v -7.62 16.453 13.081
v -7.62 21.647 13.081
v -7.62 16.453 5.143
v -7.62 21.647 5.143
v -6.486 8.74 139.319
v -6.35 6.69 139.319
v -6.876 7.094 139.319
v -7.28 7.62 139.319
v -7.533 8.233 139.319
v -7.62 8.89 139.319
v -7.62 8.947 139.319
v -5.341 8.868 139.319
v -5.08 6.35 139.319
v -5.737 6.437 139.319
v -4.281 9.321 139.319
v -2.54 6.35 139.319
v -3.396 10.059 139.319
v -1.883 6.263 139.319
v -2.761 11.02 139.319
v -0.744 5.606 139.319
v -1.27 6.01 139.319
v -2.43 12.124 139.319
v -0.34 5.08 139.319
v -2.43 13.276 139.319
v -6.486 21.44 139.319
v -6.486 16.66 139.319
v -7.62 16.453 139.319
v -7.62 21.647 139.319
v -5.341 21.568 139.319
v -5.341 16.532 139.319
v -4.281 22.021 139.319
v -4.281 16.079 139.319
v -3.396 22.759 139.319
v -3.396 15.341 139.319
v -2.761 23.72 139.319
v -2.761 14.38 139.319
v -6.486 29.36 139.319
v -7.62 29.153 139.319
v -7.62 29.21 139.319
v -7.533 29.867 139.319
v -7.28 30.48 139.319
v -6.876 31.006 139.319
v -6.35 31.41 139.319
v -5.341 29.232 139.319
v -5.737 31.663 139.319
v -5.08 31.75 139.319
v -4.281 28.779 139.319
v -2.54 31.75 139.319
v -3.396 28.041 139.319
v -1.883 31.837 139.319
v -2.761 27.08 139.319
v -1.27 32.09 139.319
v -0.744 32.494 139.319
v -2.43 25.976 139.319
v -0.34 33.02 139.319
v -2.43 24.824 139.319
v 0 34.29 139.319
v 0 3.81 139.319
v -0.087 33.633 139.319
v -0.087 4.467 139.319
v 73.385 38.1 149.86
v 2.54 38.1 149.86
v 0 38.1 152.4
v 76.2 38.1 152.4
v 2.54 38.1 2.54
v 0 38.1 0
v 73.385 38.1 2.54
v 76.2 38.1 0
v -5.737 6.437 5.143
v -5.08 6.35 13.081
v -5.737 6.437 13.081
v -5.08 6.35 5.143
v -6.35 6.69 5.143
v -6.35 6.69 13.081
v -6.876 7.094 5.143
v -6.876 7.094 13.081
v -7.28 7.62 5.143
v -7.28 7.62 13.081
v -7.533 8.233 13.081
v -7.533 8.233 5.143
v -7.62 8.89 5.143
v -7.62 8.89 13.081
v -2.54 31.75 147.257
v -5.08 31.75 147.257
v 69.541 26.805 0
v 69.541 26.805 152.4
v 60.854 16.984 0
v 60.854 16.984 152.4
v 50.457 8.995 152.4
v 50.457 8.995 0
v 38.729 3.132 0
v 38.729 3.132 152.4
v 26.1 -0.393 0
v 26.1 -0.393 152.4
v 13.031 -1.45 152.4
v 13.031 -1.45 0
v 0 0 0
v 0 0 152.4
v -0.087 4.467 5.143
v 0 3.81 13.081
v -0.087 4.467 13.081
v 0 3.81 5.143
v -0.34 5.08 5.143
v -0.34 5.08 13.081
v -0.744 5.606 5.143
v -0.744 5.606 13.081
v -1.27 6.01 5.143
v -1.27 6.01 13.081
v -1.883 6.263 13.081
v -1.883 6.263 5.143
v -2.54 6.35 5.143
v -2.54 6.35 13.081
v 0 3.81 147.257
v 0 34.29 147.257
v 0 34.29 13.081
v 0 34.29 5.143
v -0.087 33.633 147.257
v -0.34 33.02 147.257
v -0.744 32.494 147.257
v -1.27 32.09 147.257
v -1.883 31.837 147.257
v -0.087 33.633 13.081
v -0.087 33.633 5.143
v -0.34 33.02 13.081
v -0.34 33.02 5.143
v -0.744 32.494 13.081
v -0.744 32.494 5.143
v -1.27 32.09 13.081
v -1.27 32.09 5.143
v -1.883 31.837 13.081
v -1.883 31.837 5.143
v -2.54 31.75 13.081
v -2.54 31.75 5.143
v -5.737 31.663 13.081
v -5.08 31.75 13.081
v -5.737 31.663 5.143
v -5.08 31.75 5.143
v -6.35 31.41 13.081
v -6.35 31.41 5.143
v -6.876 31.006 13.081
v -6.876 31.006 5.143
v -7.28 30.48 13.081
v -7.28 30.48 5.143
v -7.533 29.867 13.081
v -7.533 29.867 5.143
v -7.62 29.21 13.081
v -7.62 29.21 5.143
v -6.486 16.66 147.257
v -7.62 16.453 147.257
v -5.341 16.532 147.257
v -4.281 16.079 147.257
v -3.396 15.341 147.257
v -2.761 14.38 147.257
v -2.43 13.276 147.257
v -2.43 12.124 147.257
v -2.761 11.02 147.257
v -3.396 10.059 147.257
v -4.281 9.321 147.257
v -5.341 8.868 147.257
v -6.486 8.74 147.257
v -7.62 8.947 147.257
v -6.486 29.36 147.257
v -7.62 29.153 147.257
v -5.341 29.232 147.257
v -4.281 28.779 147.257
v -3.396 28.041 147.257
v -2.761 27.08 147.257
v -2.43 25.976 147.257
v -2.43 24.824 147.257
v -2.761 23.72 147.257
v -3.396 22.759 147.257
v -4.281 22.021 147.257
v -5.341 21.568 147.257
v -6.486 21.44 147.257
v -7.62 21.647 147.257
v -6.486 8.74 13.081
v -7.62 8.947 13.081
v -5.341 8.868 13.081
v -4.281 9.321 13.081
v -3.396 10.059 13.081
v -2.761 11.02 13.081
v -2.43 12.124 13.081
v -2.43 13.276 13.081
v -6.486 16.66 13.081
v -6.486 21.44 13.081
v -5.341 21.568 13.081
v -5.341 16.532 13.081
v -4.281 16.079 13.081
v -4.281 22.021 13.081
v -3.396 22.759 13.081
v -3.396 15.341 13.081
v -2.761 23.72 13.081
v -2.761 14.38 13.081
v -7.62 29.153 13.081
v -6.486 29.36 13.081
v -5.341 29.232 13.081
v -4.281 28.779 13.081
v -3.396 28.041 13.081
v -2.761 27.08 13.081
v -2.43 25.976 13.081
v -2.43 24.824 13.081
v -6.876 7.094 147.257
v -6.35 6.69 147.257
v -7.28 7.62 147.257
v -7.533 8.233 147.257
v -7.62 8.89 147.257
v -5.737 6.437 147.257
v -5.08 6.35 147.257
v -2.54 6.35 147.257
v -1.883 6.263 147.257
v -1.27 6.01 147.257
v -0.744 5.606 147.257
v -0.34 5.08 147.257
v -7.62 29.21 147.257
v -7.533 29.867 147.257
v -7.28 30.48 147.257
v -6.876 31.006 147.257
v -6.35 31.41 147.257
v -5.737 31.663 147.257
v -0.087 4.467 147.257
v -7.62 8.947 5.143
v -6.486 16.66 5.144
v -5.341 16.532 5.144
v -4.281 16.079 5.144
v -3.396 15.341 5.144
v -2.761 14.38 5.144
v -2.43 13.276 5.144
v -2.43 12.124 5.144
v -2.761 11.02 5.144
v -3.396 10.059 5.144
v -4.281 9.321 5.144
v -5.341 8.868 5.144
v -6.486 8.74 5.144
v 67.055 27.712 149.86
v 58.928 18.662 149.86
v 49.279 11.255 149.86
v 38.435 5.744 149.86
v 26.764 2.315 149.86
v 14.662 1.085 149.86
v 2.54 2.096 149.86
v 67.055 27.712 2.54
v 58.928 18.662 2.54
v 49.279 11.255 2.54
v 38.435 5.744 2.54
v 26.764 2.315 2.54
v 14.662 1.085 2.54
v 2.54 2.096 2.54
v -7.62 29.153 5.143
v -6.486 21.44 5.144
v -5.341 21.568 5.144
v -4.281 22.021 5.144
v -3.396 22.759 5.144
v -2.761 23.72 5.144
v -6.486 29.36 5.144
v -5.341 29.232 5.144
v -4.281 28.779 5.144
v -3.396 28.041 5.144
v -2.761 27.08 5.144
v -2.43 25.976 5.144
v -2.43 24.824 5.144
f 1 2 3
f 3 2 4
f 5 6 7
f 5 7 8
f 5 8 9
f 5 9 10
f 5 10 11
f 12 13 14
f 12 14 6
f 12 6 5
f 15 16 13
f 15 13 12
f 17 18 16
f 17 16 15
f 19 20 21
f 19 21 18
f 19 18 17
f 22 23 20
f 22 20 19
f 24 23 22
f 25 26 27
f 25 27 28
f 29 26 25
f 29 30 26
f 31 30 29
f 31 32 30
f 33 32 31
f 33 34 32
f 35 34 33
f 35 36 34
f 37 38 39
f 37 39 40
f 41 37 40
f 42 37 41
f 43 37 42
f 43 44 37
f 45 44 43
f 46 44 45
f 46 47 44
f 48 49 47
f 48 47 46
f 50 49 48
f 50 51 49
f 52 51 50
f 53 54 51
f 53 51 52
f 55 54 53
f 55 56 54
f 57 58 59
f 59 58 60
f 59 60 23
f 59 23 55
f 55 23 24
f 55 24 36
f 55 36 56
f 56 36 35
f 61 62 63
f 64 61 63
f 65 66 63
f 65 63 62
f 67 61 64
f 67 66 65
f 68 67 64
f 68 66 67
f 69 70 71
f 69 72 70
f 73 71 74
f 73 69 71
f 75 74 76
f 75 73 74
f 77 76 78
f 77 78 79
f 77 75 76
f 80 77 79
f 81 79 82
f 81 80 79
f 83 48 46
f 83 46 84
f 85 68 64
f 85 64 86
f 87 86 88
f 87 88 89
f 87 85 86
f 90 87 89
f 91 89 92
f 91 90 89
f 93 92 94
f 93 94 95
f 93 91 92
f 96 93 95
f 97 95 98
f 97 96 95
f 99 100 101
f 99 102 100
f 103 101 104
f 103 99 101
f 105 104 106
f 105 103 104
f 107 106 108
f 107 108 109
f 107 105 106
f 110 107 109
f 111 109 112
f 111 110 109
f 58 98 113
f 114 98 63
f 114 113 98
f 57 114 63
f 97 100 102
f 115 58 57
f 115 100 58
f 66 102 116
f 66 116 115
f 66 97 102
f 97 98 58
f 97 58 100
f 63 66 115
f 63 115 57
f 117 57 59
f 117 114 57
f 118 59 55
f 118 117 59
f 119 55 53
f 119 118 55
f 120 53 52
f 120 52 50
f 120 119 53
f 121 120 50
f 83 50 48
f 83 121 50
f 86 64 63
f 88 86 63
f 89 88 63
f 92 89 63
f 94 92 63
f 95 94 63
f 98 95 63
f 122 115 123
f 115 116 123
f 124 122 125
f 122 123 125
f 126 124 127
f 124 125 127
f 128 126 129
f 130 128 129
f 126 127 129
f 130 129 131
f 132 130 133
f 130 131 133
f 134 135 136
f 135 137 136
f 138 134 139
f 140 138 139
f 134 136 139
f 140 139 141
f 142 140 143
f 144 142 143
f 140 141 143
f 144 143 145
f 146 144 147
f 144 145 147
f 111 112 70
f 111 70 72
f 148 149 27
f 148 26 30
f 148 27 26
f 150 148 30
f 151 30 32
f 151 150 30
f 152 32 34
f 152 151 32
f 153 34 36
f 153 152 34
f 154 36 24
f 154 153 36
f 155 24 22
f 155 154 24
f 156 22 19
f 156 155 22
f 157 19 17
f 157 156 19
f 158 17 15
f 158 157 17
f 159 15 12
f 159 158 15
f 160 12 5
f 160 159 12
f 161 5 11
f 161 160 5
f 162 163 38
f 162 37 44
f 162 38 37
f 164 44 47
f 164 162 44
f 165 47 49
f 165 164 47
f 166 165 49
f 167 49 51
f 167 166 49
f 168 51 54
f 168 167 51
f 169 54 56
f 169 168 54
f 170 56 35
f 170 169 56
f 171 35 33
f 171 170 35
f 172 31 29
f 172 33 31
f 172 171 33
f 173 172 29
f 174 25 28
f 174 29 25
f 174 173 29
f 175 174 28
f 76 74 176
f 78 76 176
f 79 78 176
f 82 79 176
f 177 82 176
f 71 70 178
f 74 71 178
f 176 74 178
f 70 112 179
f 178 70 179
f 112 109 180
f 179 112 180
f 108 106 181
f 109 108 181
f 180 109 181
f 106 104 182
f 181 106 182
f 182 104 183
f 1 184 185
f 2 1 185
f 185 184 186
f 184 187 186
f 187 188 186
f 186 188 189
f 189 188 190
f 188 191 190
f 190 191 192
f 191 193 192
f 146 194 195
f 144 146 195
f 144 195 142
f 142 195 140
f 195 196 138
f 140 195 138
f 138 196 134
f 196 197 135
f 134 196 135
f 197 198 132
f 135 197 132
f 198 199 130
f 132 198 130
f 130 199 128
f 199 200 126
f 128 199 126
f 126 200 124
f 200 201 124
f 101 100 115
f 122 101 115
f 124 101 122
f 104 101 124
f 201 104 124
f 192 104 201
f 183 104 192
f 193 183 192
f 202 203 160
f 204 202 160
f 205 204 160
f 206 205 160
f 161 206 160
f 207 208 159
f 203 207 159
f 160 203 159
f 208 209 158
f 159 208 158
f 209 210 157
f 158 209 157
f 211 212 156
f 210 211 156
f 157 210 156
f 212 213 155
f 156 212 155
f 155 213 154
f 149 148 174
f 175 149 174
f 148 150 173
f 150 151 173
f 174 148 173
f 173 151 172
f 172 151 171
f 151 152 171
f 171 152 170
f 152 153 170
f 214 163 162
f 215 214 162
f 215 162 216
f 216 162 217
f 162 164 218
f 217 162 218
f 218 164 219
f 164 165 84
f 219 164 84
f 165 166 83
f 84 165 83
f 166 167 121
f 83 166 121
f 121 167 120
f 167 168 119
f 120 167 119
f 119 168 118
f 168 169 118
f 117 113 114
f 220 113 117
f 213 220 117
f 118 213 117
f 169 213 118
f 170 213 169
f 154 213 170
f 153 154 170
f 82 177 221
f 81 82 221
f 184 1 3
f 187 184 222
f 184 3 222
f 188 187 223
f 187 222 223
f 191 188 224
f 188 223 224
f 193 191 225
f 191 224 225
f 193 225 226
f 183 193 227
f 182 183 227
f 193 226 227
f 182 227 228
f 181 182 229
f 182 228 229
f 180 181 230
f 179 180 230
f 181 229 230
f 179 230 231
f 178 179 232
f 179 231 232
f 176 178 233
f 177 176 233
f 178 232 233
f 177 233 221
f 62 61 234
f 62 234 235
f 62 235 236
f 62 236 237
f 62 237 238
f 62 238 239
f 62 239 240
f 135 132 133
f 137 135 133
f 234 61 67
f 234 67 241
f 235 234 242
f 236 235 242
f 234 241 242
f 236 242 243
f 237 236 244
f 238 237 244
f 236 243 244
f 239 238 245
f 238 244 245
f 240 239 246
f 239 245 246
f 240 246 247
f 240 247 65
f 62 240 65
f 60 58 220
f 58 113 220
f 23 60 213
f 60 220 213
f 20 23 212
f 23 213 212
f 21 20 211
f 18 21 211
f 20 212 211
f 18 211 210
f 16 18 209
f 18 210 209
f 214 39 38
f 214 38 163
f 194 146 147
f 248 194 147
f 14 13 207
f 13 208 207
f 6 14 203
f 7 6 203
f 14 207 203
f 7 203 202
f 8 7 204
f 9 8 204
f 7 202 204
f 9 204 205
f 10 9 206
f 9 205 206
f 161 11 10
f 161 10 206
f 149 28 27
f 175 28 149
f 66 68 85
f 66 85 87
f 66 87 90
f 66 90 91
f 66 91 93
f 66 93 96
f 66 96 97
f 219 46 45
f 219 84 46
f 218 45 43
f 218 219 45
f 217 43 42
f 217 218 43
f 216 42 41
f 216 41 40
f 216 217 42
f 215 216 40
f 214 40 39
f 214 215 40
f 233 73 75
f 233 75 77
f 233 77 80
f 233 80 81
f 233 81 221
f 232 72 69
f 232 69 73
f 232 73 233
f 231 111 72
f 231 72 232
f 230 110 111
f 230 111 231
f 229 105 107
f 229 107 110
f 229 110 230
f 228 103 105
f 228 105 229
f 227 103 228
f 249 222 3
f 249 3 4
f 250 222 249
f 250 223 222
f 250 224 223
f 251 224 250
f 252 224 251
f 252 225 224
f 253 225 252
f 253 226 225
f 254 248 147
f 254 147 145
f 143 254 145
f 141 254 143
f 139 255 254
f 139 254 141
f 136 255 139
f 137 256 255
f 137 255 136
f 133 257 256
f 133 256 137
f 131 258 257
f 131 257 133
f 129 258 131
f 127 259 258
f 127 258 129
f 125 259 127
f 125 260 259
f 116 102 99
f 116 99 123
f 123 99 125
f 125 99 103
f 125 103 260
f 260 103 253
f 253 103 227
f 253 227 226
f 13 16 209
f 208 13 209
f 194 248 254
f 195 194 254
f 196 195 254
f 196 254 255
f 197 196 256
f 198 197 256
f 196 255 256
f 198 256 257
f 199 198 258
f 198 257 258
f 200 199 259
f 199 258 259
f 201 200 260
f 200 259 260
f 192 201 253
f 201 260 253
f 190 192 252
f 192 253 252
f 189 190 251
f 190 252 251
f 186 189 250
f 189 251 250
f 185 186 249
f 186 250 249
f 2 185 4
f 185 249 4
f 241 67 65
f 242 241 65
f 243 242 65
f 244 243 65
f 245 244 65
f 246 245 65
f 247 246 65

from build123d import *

# Parameters (mm, degrees)
BOSS_EXTRUDE1_DEPTH  = 152.4
SHELL1_T             = -2.54
SKETCH2_W            = 7.9375
SKETCH2_H            = 25.4
BOSS_EXTRUDE2_DEPTH  = 7.62
SKETCH3_R            = 3.9624
CUT_EXTRUDE1_DEPTH   = 12.7
FILLET1_R            = 2.54
FILLET1_OF_MIRROR1_R = 2.54


with BuildPart() as part:
    # Sketch1 → Boss-Extrude1 (new body)
    with BuildSketch(Plane.XY):
        with BuildLine():
            Line((0, 0), (0, 38.1))
            Line((0, 38.1), (76.2, 38.1))
            ThreePointArc((76.2, 38.1), (44.733669489, 5.782661022), (0, 0))
        make_face()
    extrude(amount=BOSS_EXTRUDE1_DEPTH)

    # Shell1
    shell1_openings = [part.faces().sort_by_distance(p)[0] for p in [
        (38.1, 38.1, 76.2),
    ]]
    offset(amount=SHELL1_T, openings=shell1_openings, kind=Kind.INTERSECTION)

    # Sketch2 → Boss-Extrude2 (add)
    with BuildSketch(Plane(origin=(0, 0, 0), x_dir=(0, 0, -1), z_dir=(1, 0, 0))):
        with Locations((-9.11225, 19.05)):
            Rectangle(SKETCH2_W, SKETCH2_H)
    boss_extrude2 = extrude(amount=-BOSS_EXTRUDE2_DEPTH)

    # Sketch3 → Cut-Extrude1 (cut)
    with BuildSketch(Plane(origin=(0, 0, 5.1435), x_dir=(-1, 0, 0), z_dir=(0, 0, -1))):
        with Locations((6.35, 25.4)):
            Circle(SKETCH3_R)
        with Locations((6.35, 12.7)):
            Circle(SKETCH3_R)
    cut_extrude1 = extrude(amount=-CUT_EXTRUDE1_DEPTH, mode=Mode.SUBTRACT)

    # Fillet1
    fillet1_edges = [part.edges().sort_by_distance(p)[0] for p in [
        (-7.62, 6.35, 9.11225),
        (-7.62, 31.75, 9.11225),
        (0, 31.75, 9.11225),
        (0, 6.35, 9.11225),
    ]]
    fillet(fillet1_edges, radius=FILLET1_R)

    # Mirror1: Boss-Extrude2, Cut-Extrude1 across plane
    add(boss_extrude2.mirror(Plane(origin=(0, 0, 76.2), x_dir=(1, 0, 0), z_dir=(0, 0, -1))))
    add(cut_extrude1.mirror(Plane(origin=(0, 0, 76.2), x_dir=(1, 0, 0), z_dir=(0, 0, -1))), mode=Mode.SUBTRACT)

    # Fillet1 of Mirror1
    fillet1_of_mirror1_edges = [part.edges().sort_by_distance(p)[0] for p in [
        (-7.62, 6.35, 143.28775),
        (-7.62, 31.75, 143.28775),
        (0, 31.75, 143.28775),
        (0, 6.35, 143.28775),
    ]]
    fillet(fillet1_of_mirror1_edges, radius=FILLET1_OF_MIRROR1_R)


solid = part.part
